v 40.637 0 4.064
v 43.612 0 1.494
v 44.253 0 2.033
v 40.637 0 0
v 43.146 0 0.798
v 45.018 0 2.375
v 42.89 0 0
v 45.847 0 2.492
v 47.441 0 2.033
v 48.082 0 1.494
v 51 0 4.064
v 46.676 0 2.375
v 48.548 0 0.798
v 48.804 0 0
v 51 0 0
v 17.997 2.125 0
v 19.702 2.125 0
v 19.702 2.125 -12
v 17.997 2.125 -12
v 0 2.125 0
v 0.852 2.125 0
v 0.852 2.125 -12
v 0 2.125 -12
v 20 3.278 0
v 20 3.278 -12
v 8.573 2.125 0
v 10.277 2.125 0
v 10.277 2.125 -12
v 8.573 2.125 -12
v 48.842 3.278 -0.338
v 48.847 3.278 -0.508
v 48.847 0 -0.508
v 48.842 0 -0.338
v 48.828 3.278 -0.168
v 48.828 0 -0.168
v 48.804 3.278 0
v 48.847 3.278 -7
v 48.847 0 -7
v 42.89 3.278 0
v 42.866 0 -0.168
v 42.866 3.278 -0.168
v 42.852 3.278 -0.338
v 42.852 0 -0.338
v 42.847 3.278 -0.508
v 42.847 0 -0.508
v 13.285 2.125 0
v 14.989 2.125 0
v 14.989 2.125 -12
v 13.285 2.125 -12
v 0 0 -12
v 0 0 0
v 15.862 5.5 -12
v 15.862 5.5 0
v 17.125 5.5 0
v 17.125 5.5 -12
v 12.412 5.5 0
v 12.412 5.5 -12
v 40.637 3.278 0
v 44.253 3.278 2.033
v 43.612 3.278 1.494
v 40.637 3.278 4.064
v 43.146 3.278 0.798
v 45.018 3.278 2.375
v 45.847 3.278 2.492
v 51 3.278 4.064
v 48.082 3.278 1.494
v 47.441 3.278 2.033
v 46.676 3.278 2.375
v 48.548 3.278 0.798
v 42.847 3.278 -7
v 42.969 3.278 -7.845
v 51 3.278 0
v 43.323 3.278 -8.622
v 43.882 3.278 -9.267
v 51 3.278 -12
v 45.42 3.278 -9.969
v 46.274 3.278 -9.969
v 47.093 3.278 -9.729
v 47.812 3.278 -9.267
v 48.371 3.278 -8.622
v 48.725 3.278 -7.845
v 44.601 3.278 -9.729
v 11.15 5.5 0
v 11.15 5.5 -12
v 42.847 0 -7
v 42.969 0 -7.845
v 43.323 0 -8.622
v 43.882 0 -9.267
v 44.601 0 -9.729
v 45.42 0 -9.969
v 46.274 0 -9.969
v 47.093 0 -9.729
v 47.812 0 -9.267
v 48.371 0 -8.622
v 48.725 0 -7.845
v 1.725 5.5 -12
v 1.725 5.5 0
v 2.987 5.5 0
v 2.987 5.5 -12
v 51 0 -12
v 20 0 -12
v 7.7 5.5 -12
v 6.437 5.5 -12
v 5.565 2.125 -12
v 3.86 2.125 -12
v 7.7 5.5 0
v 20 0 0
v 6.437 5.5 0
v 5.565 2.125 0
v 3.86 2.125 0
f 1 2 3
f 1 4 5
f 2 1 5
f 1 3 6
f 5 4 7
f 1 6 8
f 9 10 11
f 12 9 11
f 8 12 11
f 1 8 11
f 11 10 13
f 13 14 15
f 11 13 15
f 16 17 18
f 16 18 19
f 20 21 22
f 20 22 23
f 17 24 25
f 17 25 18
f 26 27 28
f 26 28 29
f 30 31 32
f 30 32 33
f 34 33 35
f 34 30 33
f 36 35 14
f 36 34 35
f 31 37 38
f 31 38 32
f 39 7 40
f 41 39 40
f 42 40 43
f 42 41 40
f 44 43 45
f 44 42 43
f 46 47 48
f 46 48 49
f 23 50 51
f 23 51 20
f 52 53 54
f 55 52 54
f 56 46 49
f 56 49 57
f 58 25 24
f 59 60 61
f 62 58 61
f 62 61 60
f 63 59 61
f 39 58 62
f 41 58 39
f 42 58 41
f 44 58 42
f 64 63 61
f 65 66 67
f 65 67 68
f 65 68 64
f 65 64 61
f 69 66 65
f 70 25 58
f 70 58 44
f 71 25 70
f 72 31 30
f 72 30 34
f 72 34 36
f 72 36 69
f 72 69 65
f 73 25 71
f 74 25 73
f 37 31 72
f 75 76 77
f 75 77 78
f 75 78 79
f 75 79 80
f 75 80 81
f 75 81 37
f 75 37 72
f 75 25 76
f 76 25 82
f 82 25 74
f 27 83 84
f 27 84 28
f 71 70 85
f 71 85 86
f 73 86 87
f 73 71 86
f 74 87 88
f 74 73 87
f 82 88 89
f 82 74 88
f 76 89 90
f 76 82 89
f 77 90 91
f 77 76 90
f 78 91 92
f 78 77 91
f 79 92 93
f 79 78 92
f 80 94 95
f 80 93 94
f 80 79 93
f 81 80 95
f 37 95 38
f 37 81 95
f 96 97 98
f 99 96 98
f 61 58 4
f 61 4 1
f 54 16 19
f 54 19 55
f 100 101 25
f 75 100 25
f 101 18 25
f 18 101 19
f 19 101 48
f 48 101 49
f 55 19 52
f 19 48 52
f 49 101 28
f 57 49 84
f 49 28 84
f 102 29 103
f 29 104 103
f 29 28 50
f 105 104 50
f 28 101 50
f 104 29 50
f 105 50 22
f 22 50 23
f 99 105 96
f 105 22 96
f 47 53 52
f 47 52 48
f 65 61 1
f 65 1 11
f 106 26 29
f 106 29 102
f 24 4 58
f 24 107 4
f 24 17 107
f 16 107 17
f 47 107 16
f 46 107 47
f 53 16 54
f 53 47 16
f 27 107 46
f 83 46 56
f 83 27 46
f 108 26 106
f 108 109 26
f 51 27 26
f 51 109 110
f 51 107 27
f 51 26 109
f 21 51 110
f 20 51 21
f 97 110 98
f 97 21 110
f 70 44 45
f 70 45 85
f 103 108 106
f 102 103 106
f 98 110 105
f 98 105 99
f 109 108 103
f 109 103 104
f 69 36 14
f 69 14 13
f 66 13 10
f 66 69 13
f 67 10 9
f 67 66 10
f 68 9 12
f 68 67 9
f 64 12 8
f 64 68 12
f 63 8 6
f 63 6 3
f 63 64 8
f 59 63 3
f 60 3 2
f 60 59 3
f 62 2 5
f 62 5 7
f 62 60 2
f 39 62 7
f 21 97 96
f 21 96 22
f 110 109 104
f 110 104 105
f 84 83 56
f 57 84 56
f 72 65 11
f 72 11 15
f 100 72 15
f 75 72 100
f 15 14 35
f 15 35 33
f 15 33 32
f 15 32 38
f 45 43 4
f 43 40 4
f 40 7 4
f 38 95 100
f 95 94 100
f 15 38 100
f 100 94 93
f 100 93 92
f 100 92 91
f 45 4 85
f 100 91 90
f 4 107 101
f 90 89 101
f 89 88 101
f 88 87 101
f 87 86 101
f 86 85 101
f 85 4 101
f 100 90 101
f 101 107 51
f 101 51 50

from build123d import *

# Parameters (mm, degrees)
BLANKSKE_W          = 20
BLANKSKE_H          = 5.5
BLANK_DEPTH         = 12
TOOTHCUTSIM_DEPTH   = 24.963513933
TEETHCUTS_COUNT     = 5
TEETHCUTS_PITCH     = 4.712388975
SKETCH2_W           = 12
SKETCH2_H           = 3.278265845
BOSS_EXTRUDE1_DEPTH = 31
CUT_EXTRUDE2_REACH  = 54.495
BOSS_EXTRUDE2_DEPTH = 3.278266
CUT_EXTRUDE3_DEPTH  = 22.5


with BuildPart() as part:
    # BlankSke → Blank (new body)
    with BuildSketch(Plane.XY):
        with Locations((10, 2.75)):
            Rectangle(BLANKSKE_W, BLANKSKE_H)
    extrude(amount=-BLANK_DEPTH)

    # TooCutSkeSim → ToothCutSim (cut, through all)
    with BuildSketch(Plane.XY):
        Polygon((0.852189273, 2.125), (-0.852189273, 2.125), (-1.731592507, 5.5254), (1.731592507, 5.5254), align=None)
    toothcutsim = extrude(amount=-TOOTHCUTSIM_DEPTH, mode=Mode.SUBTRACT)

    # TeethCuts: ToothCutSim ×5
    with Locations(*[(i * TEETHCUTS_PITCH, 0, 0) for i in range(1, TEETHCUTS_COUNT)]):
        add(toothcutsim, mode=Mode.SUBTRACT)

    # Sketch2 → Boss-Extrude1 (add)
    with BuildSketch(Plane(origin=(20, 0, 0), x_dir=(0, 0, -1), z_dir=(1, 0, 0))):
        with Locations((6, 1.639132923)):
            Rectangle(SKETCH2_W, SKETCH2_H)
    extrude(amount=BOSS_EXTRUDE1_DEPTH)

    # Sketch3 → Cut-Extrude2 (cut, up to next)
    with BuildSketch(Plane(origin=(0, 3.278265845, 0), x_dir=(1, 0, 0), z_dir=(0, 1, 0)), mode=Mode.PRIVATE) as cut_extrude2_sk1:
        with BuildLine():
            Line((48.847, 7), (48.847, 5))
            ThreePointArc((48.847, 5), (45.847, 2), (42.847, 5))
            Line((42.847, 5), (42.847, 7))
            ThreePointArc((42.847, 7), (45.847, 10), (48.847, 7))
        make_face()
    cut_extrude2_tool1 = extrude(cut_extrude2_sk1.sketch, amount=-CUT_EXTRUDE2_REACH, mode=Mode.PRIVATE) & part.part
    add(cut_extrude2_tool1.solids().sort_by_distance((45.847, 3.278266, -6))[0], mode=Mode.SUBTRACT)

    # Sketch5 → Boss-Extrude2 (add)
    with BuildSketch(Plane(origin=(0, 3.278265845, 0), x_dir=(1, 0, 0), z_dir=(0, 1, 0))):
        with BuildLine():
            Line((42.890323487, 0), (40.636775161, 0))
            Line((40.636775161, 0), (40.636775161, -4.064))
            Line((40.636775161, -4.064), (51, -4.064))
            Line((51, -4.064), (51, 0))
            Line((51, 0), (48.803676513, 0))
            ThreePointArc((48.803676513, 0), (45.847, -2.492), (42.890323487, 0))
        make_face()
    extrude(amount=-BOSS_EXTRUDE2_DEPTH)

    # Sketch6 → Cut-Extrude3 (cut)
    with BuildSketch(Plane(origin=(0, 3.278265845, 0), x_dir=(1, 0, 0), z_dir=(0, 1, 0))):
        with BuildLine():
            Line((48.847, 7), (48.847, 0.508))
            ThreePointArc((48.847, 0.508), (45.847, -2.492), (42.847, 0.508))
            Line((42.847, 0.508), (42.847, 7))
            ThreePointArc((42.847, 7), (45.847, 10), (48.847, 7))
        make_face()
    extrude(amount=-CUT_EXTRUDE3_DEPTH, mode=Mode.SUBTRACT)


solid = part.part
